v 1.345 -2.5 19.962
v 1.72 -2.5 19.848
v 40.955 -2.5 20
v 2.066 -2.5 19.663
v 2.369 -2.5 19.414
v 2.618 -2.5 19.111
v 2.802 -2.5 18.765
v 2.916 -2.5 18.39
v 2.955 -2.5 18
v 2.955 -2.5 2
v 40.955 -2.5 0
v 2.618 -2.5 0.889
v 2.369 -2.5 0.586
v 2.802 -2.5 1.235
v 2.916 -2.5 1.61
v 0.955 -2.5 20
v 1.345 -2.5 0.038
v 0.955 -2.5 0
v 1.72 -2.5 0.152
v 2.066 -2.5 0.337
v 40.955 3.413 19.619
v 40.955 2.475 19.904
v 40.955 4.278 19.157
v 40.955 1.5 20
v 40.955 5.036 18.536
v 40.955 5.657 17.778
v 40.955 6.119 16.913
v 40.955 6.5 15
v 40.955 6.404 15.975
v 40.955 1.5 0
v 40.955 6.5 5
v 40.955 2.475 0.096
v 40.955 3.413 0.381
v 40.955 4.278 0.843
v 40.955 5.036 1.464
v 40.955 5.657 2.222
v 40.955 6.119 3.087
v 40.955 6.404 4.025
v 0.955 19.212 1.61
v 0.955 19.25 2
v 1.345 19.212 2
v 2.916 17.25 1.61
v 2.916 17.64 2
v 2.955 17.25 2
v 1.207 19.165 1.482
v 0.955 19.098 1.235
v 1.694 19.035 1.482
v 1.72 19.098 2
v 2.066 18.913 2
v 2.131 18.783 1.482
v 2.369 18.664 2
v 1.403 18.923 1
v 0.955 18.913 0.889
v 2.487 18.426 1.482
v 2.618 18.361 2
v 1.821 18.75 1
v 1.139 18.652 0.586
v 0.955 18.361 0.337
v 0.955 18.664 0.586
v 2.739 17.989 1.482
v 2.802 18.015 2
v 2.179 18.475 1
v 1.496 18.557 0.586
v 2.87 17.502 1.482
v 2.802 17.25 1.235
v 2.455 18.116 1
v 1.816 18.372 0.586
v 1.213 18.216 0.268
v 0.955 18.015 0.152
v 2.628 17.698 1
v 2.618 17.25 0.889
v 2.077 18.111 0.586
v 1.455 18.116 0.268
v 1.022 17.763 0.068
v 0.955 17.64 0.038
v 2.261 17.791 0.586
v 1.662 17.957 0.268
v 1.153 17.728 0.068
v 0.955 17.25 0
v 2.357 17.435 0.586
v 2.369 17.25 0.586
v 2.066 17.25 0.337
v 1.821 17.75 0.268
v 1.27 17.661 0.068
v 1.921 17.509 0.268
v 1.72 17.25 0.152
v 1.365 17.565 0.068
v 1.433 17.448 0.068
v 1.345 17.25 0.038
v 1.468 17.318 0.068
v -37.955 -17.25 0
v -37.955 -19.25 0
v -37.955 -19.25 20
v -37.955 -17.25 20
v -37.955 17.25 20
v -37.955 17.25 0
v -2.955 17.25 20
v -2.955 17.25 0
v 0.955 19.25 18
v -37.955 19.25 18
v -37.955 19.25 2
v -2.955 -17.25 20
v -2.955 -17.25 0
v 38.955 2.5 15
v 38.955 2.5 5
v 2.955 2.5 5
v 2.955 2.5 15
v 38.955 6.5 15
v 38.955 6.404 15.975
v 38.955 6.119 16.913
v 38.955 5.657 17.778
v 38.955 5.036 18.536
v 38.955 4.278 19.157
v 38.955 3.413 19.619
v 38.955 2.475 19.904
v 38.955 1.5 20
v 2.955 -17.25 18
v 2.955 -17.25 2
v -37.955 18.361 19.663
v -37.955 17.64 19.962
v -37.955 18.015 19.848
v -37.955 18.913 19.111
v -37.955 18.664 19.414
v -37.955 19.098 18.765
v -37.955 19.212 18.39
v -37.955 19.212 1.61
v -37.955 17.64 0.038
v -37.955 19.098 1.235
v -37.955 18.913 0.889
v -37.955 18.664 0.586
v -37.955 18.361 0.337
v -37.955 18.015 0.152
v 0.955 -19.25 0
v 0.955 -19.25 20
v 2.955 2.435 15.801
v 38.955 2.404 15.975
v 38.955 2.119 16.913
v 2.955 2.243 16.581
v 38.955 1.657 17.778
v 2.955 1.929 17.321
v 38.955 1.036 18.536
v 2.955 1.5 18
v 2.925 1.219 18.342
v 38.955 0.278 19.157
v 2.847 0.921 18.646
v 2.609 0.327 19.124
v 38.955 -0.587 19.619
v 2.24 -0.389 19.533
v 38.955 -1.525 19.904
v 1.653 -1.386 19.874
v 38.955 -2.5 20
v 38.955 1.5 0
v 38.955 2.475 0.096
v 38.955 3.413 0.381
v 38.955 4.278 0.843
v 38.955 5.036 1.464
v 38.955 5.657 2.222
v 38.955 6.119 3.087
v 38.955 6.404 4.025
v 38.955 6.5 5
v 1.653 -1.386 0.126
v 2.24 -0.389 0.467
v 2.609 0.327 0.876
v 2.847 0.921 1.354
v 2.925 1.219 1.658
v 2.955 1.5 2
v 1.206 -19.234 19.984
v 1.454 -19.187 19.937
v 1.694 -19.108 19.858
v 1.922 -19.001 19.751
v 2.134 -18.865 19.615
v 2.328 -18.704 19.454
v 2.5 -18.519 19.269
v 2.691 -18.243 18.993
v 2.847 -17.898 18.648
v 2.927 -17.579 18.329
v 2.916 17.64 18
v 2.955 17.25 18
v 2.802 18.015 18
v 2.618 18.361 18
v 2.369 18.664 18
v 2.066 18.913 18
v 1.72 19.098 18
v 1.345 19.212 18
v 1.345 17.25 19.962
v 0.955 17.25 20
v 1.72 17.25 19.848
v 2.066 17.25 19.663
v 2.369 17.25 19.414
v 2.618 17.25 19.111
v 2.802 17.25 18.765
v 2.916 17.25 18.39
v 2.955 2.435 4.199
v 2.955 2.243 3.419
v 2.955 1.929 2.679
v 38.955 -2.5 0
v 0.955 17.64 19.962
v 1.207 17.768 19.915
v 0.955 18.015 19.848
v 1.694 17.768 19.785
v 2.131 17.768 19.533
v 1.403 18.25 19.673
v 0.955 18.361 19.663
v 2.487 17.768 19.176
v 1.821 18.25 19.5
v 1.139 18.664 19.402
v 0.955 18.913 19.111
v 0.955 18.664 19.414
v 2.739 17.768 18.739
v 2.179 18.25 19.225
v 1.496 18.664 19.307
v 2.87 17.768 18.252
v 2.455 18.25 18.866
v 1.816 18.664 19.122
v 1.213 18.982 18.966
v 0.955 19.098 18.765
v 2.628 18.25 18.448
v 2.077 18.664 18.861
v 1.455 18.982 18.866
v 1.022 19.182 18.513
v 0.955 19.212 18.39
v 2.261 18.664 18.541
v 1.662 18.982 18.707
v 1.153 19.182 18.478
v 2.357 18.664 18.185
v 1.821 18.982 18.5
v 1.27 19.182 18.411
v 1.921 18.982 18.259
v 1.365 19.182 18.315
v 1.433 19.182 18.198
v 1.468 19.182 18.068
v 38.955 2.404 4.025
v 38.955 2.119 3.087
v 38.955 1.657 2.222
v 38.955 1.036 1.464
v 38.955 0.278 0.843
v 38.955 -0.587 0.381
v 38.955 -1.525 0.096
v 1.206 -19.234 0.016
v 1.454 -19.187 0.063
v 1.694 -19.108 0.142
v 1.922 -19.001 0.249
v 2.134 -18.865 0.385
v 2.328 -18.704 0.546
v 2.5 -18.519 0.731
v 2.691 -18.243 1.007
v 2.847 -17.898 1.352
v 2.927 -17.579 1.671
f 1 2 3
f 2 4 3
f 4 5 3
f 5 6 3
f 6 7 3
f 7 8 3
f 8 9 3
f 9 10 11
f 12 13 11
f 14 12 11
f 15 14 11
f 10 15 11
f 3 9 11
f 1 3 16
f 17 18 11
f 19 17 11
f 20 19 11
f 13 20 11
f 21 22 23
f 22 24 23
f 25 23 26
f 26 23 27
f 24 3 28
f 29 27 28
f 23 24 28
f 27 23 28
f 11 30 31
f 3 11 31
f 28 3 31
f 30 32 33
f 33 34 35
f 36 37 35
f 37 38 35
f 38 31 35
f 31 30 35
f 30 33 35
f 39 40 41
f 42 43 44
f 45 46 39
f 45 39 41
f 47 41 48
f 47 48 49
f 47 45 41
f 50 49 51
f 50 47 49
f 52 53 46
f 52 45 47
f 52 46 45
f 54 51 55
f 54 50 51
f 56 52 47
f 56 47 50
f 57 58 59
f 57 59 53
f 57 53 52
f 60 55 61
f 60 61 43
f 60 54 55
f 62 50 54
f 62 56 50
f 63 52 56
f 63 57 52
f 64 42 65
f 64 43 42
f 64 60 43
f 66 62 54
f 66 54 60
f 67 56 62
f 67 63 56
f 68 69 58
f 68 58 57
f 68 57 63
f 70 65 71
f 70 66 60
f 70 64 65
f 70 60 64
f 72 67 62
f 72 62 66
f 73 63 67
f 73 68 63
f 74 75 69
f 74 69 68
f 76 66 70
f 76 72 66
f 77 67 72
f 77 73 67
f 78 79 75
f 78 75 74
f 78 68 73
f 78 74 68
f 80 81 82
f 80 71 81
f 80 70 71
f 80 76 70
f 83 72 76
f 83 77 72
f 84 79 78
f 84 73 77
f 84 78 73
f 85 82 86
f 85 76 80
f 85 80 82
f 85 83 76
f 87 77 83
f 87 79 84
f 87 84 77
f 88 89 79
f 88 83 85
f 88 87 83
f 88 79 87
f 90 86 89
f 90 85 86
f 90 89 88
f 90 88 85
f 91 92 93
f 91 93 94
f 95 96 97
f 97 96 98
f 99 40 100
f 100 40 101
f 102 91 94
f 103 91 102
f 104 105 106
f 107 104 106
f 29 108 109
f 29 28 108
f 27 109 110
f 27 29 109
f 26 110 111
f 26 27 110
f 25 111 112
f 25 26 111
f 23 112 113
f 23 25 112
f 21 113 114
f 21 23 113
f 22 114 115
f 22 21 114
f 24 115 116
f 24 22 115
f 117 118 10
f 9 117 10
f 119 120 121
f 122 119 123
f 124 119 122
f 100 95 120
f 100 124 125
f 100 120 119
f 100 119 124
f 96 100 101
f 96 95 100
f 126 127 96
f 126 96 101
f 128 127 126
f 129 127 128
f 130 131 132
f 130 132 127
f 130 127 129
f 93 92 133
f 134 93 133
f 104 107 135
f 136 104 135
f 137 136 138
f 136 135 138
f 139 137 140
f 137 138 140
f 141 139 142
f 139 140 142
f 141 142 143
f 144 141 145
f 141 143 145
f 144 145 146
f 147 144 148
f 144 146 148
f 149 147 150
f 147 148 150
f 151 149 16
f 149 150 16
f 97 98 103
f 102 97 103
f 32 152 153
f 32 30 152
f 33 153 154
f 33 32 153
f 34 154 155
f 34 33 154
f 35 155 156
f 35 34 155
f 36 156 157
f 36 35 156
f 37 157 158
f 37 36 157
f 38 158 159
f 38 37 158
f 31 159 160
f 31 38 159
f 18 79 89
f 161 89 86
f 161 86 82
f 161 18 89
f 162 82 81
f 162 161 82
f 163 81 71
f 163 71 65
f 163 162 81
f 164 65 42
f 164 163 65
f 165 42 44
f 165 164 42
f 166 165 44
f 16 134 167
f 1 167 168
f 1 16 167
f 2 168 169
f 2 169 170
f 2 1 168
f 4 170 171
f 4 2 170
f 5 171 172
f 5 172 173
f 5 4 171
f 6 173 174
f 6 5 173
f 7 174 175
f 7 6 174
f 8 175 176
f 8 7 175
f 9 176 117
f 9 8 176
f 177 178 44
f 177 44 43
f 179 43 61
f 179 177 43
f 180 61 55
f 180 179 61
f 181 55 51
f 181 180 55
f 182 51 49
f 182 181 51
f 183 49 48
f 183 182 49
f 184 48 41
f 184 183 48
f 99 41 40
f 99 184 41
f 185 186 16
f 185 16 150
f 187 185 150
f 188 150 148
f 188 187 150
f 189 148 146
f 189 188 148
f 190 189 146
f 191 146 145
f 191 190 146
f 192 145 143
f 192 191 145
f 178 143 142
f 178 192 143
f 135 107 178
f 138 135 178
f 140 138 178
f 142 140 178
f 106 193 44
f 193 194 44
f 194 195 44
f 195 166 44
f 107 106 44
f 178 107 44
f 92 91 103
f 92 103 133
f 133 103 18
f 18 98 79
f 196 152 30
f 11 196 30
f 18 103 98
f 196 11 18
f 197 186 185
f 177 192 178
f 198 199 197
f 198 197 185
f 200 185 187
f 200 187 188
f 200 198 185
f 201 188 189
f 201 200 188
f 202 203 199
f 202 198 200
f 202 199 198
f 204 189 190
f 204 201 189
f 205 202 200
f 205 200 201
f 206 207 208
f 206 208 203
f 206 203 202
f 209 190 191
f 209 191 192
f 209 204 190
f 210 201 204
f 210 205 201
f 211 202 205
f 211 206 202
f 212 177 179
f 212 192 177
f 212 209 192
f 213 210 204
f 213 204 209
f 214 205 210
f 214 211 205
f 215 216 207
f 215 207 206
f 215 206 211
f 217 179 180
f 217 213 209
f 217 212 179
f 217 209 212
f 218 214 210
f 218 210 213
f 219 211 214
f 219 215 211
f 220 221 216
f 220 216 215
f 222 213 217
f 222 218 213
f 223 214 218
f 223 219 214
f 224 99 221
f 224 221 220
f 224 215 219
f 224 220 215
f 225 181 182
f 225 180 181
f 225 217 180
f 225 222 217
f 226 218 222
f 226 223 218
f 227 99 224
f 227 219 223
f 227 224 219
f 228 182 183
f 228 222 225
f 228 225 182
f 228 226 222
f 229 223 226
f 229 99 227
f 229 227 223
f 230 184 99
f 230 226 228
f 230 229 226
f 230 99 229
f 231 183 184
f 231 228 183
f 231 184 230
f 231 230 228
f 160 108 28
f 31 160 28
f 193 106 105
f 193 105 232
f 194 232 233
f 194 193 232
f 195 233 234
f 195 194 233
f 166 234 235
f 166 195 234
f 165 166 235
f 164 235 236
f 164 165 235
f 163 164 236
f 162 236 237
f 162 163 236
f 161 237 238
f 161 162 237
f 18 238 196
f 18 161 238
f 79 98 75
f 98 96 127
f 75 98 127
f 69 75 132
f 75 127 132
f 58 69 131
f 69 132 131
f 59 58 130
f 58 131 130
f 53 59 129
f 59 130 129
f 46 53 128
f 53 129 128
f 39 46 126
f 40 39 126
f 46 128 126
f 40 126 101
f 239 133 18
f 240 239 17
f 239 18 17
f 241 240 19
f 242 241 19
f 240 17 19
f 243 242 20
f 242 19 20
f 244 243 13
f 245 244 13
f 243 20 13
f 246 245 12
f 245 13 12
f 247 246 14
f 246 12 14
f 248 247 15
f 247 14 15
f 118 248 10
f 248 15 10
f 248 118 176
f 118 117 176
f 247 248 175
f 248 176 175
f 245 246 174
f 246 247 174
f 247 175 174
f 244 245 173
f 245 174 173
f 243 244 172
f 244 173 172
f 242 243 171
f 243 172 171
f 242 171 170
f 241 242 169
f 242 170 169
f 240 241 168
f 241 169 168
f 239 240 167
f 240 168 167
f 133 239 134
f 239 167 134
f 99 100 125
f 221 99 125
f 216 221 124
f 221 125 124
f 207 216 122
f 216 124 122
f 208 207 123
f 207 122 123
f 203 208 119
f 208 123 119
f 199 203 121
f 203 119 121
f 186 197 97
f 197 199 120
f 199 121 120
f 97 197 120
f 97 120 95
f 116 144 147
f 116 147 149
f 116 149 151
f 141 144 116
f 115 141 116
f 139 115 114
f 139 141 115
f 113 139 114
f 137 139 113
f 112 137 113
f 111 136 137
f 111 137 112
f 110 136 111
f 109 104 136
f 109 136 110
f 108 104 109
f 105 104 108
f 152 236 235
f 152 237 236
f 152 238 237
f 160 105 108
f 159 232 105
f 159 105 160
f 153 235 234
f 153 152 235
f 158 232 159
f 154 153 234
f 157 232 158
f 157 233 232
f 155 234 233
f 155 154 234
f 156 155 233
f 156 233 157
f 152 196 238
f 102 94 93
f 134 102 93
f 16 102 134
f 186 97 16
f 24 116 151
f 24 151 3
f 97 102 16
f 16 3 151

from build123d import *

# Parameters (mm, degrees)
F0_W         = 35
F0_H         = 2
F0_W_2       = 2
F0_H_2       = 4
F1_DEPTH     = 20
F2_R         = 4.99999
F3_R         = 5
F4_R         = 2
F5_T1_DEPTH  = 43.9093010689
F5_S5_W      = 2
F5_S5_H      = 2
F5_T6_DEPTH  = 2
F5_S11_W     = 2
F5_S11_H     = 2
F5_T12_DEPTH = 2


# Not quite as in the source:
# - a fillet or chamfer that OpenCascade refuses, or shapes differently, is made with other operations: its cross-section is extruded or revolved along the edge and cut away or added
# - a fillet or chamfer is up to 0.001 mm smaller than in the source, because OpenCascade refuses the exact size


with BuildPart() as f1:
    # F0 (on Top) → F1 (new body)
    with BuildSketch(Plane.XY):
        with Locations((-20.4546505344, 18.25)):
            Rectangle(F0_W, F0_H)
        Polygon((2.9546505344, 2.5), (2.9546505344, 19.25), (-2.9546505344, 19.25), (-2.9546505344, 17.25), (-2.9546505344, -17.25), (-2.9546505344, -19.25), (2.9546505344, -19.25), (2.9546505344, -2.5), align=None)
        Polygon((38.9546505344, 2.5), (2.9546505344, 2.5), (2.9546505344, -2.5), (40.9546505344, -2.5), (40.9546505344, 2.5), align=None)
        with Locations((39.9546505344, 4.5)):
            Rectangle(F0_W_2, F0_H_2)
        with Locations((-20.4546505344, -18.25)):
            Rectangle(F0_W, F0_H)
    extrude(amount=F1_DEPTH)

    # F2 (radius 5 in the source; OpenCascade refuses exactly that, so slightly less here)
    f2_edges = [f1.edges().sort_by_distance(p)[0] for p in [
        (20.954651, 2.5, 20),
        (20.954651, 2.5, 0),
    ]]
    fillet(f2_edges, radius=F2_R)

    # F3
    f3_edges = [f1.edges().sort_by_distance(p)[0] for p in [
        (39.954651, 6.5, 20),
        (39.954651, 6.5, 0),
    ]]
    fillet(f3_edges, radius=F3_R)

    # F4
    f4_edges = [f1.edges().sort_by_distance(p)[0] for p in [
        (2.954651, 10.875, 20),
        (2.954651, -10.875, 20),
        (2.954651, 10.875, 0),
        (2.954651, -10.875, 0),
        (2.954651, 19.25, 10),
        (2.954651, -19.25, 10),
    ]]
    fillet(f4_edges, radius=F4_R)

    # F5: fillet of radius 2 on 2 edges, made by hand

    # F5_s2 → F5_t1 (cut)
    with BuildSketch(Plane.YZ.offset(-42.9546505344)):
        with BuildLine():
            ThreePointArc((17.25, 0), (18.6642135624, 0.5857864376), (19.25, 2))
            Line((19.25, 2), (19.25, 0))
            Line((19.25, 0), (17.25, 0))
        make_face()
        with BuildLine():
            ThreePointArc((19.25, 18), (18.6642135624, 19.4142135624), (17.25, 20))
            Line((17.25, 20), (19.25, 20))
            Line((19.25, 20), (19.25, 18))
        make_face()
    extrude(amount=F5_T1_DEPTH, mode=Mode.SUBTRACT)


with BuildPart() as f5_tool4:
    # F5_s5 → F5_t6 (new body)
    with BuildSketch(Plane.XZ.offset(-17.25)):
        with Locations((1.9546505344, 19)):
            Rectangle(F5_S5_W, F5_S5_H)
    extrude(amount=-F5_T6_DEPTH)

    # F5_s7 → F5_t8 (revolve, cut)
    with BuildSketch(Plane(origin=(0.9546505344, 17.25, 18), x_dir=(-0.7071067812, 0, -0.7071067812), z_dir=(0.7071067812, 0, -0.7071067812))):
        with BuildLine():
            ThreePointArc((0, -2), (2, 0), (0, 2))
            Line((0, 2), (0, -2))
        make_face()
    revolve(axis=Axis((0.9546505344, 17.25, 18), (0, 1, 0)), mode=Mode.SUBTRACT)


with BuildPart() as f1_1:
    add(f1.part)

    # F5_t3: cut F5_tool4
    add(f5_tool4.part, mode=Mode.SUBTRACT)


with BuildPart() as f5_tool10:
    # F5_s11 → F5_t12 (new body)
    with BuildSketch(Plane.XY.offset(2)):
        with Locations((1.9546505344, 18.25)):
            Rectangle(F5_S11_W, F5_S11_H)
    extrude(amount=-F5_T12_DEPTH)

    # F5_s13 → F5_t14 (revolve, cut)
    with BuildSketch(Plane(origin=(0.9546505344, 17.25, 2), x_dir=(-0.7071067812, -0.7071067812, 0), z_dir=(0.7071067812, -0.7071067812, 0))):
        with BuildLine():
            ThreePointArc((0, -2), (2, 0), (0, 2))
            Line((0, 2), (0, -2))
        make_face()
    revolve(axis=Axis((0.9546505344, 17.25, 2), (0, 0, -1)), mode=Mode.SUBTRACT)


with BuildPart() as f1_2:
    add(f1_1.part)

    # F5_t9: cut F5_tool10
    add(f5_tool10.part, mode=Mode.SUBTRACT)


solid = f1_2.part
